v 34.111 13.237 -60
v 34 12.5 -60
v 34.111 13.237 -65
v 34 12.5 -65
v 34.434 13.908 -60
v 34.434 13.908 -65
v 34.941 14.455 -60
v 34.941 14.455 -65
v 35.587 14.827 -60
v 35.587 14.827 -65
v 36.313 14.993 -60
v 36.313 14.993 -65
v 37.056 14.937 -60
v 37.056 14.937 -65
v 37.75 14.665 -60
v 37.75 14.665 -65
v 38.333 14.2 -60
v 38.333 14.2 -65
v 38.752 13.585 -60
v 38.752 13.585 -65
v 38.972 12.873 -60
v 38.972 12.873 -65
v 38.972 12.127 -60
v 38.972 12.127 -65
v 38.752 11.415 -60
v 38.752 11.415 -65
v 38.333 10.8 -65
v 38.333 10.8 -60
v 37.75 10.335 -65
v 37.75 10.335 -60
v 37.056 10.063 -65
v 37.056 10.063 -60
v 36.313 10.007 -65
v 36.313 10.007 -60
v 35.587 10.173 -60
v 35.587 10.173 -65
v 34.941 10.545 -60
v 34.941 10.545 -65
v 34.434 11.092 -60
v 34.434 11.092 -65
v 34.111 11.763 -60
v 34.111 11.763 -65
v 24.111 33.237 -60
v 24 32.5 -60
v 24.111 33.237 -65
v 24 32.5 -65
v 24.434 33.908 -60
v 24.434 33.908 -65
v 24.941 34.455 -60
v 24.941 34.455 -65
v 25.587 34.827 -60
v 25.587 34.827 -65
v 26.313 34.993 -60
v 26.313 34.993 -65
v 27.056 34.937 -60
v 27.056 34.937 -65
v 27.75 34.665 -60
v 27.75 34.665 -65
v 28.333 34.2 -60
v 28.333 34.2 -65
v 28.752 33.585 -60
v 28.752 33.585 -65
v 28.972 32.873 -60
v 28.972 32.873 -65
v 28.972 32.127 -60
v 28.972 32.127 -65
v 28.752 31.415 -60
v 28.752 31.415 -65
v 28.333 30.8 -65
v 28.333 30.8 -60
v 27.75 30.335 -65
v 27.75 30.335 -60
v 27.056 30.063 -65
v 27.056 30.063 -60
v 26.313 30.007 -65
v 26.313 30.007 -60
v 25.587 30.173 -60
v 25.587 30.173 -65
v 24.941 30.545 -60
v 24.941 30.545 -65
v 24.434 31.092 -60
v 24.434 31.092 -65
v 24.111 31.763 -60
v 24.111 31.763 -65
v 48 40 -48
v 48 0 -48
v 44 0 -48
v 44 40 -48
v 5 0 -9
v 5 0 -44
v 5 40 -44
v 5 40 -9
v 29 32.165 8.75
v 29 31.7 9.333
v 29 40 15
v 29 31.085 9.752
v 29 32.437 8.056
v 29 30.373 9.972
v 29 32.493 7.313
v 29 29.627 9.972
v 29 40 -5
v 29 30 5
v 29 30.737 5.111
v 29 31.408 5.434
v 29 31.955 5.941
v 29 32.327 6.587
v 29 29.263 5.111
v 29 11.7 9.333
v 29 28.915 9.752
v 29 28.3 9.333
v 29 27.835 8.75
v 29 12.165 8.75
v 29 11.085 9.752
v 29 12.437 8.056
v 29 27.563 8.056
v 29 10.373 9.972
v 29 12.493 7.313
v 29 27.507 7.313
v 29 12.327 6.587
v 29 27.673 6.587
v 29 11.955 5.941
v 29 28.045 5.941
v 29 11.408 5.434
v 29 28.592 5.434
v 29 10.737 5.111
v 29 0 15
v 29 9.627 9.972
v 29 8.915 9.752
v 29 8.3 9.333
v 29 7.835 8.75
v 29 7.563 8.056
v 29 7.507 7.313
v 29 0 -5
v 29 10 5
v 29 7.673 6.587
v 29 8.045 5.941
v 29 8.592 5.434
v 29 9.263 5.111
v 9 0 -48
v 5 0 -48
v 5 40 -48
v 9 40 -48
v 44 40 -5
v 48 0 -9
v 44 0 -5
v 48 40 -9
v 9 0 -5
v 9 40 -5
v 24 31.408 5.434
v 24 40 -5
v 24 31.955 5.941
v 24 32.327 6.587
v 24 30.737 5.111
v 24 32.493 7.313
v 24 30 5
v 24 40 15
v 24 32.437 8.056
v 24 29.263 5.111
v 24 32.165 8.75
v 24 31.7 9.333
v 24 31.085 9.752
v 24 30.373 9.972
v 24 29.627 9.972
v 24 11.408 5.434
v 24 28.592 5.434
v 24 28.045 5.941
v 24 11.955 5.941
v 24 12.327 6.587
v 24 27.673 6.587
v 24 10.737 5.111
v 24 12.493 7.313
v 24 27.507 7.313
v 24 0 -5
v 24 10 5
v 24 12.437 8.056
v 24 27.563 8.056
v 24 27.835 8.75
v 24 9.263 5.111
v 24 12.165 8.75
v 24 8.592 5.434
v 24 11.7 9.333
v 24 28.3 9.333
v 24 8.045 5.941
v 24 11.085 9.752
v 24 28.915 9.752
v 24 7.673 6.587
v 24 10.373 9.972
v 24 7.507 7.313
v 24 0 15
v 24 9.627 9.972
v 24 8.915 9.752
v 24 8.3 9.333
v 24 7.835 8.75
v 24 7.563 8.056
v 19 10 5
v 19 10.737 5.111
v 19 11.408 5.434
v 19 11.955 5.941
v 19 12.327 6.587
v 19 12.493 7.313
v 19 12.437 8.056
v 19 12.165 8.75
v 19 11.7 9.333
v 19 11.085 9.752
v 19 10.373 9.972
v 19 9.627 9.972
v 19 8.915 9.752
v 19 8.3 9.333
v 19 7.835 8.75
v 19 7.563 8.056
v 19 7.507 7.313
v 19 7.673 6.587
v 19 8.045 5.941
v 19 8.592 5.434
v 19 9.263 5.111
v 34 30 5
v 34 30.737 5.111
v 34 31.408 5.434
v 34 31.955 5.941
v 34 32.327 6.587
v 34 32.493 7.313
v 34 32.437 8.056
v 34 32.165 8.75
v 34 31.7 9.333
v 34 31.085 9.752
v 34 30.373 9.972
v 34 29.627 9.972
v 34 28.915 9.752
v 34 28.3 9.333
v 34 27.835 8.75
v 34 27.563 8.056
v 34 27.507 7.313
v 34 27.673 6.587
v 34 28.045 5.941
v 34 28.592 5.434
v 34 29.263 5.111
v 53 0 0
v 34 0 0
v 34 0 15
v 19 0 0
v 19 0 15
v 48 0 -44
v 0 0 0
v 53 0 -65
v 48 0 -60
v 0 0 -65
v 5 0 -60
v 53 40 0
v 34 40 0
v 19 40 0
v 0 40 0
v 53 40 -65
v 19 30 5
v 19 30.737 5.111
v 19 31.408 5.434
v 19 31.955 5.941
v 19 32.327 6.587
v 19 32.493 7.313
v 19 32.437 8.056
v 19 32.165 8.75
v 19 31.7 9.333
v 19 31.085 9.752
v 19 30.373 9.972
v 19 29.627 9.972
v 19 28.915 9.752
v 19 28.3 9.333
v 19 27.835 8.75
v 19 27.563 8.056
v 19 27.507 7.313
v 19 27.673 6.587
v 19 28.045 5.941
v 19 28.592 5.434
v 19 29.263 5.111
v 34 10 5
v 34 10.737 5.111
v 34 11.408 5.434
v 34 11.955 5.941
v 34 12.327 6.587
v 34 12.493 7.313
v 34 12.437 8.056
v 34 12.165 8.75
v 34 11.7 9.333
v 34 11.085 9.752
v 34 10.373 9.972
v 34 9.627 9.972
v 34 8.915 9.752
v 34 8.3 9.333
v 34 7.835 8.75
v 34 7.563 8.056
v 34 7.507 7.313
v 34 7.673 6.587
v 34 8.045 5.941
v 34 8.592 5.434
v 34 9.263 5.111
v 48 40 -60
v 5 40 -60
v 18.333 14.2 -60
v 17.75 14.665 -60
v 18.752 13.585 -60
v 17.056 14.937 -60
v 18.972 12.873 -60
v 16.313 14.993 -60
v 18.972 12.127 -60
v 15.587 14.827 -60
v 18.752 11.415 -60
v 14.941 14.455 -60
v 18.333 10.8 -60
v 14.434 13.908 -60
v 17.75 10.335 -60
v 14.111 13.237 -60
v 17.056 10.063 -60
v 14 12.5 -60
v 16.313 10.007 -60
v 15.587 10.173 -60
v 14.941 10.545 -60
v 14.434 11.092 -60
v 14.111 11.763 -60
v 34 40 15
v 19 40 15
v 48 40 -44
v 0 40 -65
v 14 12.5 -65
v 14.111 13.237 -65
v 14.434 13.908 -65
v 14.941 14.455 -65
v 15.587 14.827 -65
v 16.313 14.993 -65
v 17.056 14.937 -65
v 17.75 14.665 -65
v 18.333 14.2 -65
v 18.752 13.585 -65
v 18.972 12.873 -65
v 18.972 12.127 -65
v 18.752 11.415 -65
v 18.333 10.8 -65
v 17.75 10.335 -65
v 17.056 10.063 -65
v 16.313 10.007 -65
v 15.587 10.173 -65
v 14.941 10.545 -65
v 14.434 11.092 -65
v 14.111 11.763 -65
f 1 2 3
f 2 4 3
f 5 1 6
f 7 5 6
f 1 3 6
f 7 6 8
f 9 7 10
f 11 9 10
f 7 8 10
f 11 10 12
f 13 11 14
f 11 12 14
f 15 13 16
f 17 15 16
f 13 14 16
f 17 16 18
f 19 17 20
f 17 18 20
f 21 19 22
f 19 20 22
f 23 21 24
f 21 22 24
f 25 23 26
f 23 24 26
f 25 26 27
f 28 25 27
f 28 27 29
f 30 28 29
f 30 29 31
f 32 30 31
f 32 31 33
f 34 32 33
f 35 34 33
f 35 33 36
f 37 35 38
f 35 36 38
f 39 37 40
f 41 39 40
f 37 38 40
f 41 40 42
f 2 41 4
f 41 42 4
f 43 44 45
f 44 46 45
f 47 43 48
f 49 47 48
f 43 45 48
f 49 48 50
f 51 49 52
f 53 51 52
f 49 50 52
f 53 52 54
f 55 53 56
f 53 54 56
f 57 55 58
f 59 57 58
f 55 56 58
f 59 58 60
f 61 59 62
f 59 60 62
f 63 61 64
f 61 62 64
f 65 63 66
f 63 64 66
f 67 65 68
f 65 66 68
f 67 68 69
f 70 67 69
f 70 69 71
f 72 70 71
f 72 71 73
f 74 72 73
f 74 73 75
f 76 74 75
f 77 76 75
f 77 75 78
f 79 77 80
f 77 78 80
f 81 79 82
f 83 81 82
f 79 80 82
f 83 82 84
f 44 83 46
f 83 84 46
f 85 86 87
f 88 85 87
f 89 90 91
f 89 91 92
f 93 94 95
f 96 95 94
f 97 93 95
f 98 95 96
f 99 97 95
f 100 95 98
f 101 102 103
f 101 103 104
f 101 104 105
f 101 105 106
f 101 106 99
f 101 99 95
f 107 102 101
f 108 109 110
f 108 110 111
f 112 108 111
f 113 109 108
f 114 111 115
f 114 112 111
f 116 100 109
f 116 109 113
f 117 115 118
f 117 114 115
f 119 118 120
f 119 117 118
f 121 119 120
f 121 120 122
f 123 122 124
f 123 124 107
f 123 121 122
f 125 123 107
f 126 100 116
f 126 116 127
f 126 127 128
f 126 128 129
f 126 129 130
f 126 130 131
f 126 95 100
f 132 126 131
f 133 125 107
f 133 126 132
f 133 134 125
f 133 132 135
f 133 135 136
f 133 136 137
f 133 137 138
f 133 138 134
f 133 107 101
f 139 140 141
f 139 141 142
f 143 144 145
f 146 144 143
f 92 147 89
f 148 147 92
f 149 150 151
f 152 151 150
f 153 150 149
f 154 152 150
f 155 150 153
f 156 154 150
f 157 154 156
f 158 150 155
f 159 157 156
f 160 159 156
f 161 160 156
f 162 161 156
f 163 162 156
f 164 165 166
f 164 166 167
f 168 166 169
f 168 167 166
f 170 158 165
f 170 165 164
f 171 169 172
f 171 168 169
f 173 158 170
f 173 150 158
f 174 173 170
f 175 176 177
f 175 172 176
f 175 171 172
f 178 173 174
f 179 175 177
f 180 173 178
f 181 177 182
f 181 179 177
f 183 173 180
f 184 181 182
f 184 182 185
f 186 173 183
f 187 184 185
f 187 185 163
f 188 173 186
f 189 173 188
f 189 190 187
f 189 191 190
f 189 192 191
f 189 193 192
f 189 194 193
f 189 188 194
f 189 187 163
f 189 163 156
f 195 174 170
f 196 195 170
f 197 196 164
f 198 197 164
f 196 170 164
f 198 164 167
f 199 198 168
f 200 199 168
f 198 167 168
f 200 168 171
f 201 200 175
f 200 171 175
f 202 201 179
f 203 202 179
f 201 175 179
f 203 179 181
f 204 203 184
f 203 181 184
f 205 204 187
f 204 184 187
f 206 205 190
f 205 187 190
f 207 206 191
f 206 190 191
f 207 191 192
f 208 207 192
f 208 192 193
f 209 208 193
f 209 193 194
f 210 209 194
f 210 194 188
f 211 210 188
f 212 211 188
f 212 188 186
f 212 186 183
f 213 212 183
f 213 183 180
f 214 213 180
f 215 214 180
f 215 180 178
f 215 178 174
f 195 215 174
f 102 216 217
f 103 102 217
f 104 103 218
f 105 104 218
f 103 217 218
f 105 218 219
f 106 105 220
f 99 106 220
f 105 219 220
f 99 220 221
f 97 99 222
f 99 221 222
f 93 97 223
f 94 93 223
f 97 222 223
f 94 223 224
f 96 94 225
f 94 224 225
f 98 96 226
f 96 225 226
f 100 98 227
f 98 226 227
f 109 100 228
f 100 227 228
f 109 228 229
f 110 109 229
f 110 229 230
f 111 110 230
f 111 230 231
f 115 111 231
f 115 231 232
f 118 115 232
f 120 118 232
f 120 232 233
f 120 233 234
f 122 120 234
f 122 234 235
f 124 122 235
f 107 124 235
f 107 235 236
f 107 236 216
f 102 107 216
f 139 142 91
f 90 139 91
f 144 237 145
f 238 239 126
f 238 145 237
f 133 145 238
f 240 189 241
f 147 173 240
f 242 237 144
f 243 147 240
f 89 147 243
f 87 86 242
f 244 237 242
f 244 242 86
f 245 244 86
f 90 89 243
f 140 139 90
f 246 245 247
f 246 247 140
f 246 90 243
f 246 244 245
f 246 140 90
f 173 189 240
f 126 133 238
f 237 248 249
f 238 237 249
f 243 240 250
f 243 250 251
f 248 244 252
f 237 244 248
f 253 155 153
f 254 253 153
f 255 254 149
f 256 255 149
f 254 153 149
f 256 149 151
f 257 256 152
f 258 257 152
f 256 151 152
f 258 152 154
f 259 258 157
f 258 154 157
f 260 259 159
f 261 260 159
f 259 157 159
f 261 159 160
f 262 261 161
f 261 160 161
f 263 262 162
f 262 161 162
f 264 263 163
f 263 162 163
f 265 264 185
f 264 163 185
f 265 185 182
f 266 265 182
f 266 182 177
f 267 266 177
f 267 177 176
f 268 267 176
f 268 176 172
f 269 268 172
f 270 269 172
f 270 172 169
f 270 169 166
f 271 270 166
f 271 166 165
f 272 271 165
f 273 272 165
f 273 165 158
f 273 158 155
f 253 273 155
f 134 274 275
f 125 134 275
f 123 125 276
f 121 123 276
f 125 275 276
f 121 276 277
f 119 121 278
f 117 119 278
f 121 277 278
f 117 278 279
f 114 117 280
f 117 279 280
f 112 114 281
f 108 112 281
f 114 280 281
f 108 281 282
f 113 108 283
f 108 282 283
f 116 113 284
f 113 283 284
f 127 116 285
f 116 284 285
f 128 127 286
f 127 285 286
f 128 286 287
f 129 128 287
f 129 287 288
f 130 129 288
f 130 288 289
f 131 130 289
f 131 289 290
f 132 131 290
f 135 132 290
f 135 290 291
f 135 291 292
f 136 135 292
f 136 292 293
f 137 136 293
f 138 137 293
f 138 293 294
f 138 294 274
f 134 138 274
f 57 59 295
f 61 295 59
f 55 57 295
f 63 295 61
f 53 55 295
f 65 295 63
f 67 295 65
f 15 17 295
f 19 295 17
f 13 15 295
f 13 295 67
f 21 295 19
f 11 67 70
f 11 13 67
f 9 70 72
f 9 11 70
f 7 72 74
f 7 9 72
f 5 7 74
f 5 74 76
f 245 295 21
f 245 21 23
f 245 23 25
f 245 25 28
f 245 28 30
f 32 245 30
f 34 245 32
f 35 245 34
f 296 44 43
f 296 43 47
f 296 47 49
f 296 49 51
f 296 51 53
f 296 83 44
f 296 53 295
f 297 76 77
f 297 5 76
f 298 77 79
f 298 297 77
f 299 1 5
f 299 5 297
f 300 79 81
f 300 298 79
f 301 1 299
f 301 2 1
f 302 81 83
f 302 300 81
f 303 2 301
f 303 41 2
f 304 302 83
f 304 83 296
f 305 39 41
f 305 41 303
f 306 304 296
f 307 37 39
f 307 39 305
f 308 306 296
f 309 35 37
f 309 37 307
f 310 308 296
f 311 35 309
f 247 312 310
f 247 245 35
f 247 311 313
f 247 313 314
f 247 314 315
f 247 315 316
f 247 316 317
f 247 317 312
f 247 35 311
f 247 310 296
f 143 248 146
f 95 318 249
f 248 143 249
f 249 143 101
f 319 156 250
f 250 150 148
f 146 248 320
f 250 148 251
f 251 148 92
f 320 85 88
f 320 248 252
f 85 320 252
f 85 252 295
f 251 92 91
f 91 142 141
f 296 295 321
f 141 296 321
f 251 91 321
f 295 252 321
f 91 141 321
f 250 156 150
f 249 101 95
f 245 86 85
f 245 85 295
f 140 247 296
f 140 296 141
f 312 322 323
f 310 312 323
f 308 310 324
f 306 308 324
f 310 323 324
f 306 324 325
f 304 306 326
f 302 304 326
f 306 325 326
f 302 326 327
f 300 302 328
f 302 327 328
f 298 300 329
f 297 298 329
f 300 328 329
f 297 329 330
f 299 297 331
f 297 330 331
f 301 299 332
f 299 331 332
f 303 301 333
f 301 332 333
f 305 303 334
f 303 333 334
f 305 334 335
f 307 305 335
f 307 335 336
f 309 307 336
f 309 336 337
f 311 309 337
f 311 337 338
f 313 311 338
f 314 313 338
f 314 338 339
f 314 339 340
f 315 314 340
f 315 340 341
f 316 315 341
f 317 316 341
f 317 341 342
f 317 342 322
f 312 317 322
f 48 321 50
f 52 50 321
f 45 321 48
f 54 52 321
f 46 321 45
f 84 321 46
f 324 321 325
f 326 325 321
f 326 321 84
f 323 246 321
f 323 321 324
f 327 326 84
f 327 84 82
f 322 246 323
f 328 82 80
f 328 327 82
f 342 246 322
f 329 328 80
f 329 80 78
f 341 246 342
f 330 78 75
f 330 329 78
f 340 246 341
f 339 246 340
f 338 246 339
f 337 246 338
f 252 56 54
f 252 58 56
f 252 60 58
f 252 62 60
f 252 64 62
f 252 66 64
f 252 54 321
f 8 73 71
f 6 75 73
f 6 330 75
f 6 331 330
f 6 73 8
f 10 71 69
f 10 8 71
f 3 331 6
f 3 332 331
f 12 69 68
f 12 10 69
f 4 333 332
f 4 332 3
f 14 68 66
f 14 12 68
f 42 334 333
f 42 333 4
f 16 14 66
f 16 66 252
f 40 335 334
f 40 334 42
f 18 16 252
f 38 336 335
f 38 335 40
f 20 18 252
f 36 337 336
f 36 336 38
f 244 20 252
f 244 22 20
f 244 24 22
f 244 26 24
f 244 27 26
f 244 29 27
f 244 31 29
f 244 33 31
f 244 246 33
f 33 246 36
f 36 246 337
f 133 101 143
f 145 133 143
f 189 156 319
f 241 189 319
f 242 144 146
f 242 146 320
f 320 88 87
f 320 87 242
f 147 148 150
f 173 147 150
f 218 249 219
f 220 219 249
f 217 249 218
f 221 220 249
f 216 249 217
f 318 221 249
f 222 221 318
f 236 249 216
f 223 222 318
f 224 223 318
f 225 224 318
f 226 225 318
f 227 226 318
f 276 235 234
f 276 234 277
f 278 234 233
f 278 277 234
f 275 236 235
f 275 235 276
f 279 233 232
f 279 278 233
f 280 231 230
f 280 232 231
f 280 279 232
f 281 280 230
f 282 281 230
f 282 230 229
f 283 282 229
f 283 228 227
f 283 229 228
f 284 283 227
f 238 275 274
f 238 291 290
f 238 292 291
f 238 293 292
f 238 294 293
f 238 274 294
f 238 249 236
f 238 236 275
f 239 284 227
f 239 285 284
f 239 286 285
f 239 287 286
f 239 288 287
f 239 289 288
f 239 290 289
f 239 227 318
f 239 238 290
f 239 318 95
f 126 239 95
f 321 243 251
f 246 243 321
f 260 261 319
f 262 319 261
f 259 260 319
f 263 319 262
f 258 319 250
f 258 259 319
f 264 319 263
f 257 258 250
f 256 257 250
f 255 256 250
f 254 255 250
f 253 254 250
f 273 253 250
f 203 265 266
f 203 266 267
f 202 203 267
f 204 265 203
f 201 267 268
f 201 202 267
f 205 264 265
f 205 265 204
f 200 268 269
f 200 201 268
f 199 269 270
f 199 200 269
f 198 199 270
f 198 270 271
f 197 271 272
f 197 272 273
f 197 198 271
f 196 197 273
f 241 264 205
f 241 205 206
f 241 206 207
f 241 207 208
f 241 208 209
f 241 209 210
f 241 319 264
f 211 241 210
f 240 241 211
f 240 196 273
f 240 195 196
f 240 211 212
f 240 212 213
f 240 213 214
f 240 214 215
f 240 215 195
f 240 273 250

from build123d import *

# Parameters (mm, degrees)
MAIN_DEPTH          = 40
CHAMFER_1_SIZE      = 4
HOLES_REACH         = 105.966
SKETCH_2_R          = 2.5
EXTRUDE_3_DEPTH     = 40
CUT_EXTRUDE_4_REACH = 85.552
SKETCH_4_R          = 2.5


with BuildPart() as part:
    # Эскиз1 → main (new body)
    with BuildSketch(Plane(origin=(0, 0, 0), x_dir=(1, 0, 0), z_dir=(0, 1, 0))):
        Polygon((0, 0), (0, 65), (53, 65), (53, 0), (34, 0), (34, -15), (29, -15), (29, 5), (48, 5), (48, 60), (5, 60), (5, 5), (24, 5), (24, -15), (19, -15), (19, 0), align=None)
    extrude(amount=MAIN_DEPTH)

    # Фаска1
    chamfer_1_edges = [part.edges().sort_by_distance(p)[0] for p in [
        (48, 20, -5),
        (5, 20, -5),
    ]]
    chamfer(chamfer_1_edges, length=CHAMFER_1_SIZE)

    # Эскиз2 → holes (cut, up to next)
    with BuildSketch(Plane(origin=(0, 0, -65), x_dir=(-1, 0, 0), z_dir=(0, 0, -1)), mode=Mode.PRIVATE) as holes_sk1:
        with Locations((-26.5, 32.5)):
            Circle(SKETCH_2_R)
    holes_tool1 = extrude(holes_sk1.sketch, amount=-HOLES_REACH, mode=Mode.PRIVATE) & part.part
    # Эскиз2 → holes (cut, up to next)
    with BuildSketch(Plane(origin=(0, 0, -65), x_dir=(-1, 0, 0), z_dir=(0, 0, -1)), mode=Mode.PRIVATE) as holes_sk2:
        with Locations((-36.5, 12.5)):
            Circle(SKETCH_2_R)
    holes_tool2 = extrude(holes_sk2.sketch, amount=-HOLES_REACH, mode=Mode.PRIVATE) & part.part
    # Эскиз2 → holes (cut, up to next)
    with BuildSketch(Plane(origin=(0, 0, -65), x_dir=(-1, 0, 0), z_dir=(0, 0, -1)), mode=Mode.PRIVATE) as holes_sk3:
        with Locations((-16.5, 12.5)):
            Circle(SKETCH_2_R)
    holes_tool3 = extrude(holes_sk3.sketch, amount=-HOLES_REACH, mode=Mode.PRIVATE) & part.part
    add(holes_tool1.solids().sort_by_distance((26.5, 32.5, -65))[0], mode=Mode.SUBTRACT)
    add(holes_tool2.solids().sort_by_distance((36.5, 12.5, -65))[0], mode=Mode.SUBTRACT)
    add(holes_tool3.solids().sort_by_distance((16.5, 12.5, -65))[0], mode=Mode.SUBTRACT)

    # Эскиз3 → Вытянуть3 (add)
    with BuildSketch(Plane(origin=(0, 0, 0), x_dir=(1, 0, 0), z_dir=(0, 1, 0))):
        Polygon((5, 44), (5, 48), (9, 48), align=None)
        Polygon((44, 48), (48, 44), (48, 48), align=None)
    extrude(amount=EXTRUDE_3_DEPTH)

    # Вытянуть4: up to this face of the body (flat: up to its plane)
    cut_extrude_4_end = Plane(part.part.faces().sort_by_distance((19, 20, 7.5))[0])
    # Эскиз4 → Вытянуть4 (cut, up to the picked face)
    with BuildSketch(Plane(origin=(34, 0, 0), x_dir=(0, 0, -1), z_dir=(1, 0, 0)), mode=Mode.PRIVATE) as cut_extrude_4_sk1:
        with Locations((-7.5, 10)):
            Circle(SKETCH_4_R)
    cut_extrude_4_tool1 = split(extrude(cut_extrude_4_sk1.sketch, amount=-CUT_EXTRUDE_4_REACH, mode=Mode.PRIVATE), bisect_by=cut_extrude_4_end, keep=Keep.BOTH, mode=Mode.PRIVATE)
    # Эскиз4 → Вытянуть4 (cut, up to the picked face)
    with BuildSketch(Plane(origin=(34, 0, 0), x_dir=(0, 0, -1), z_dir=(1, 0, 0)), mode=Mode.PRIVATE) as cut_extrude_4_sk2:
        with Locations((-7.5, 30)):
            Circle(SKETCH_4_R)
    cut_extrude_4_tool2 = split(extrude(cut_extrude_4_sk2.sketch, amount=-CUT_EXTRUDE_4_REACH, mode=Mode.PRIVATE), bisect_by=cut_extrude_4_end, keep=Keep.BOTH, mode=Mode.PRIVATE)
    add(cut_extrude_4_tool1.solids().sort_by(Axis((34, 10, 7.5), (-1, 0, 0)))[0], mode=Mode.SUBTRACT)
    add(cut_extrude_4_tool2.solids().sort_by(Axis((34, 30, 7.5), (-1, 0, 0)))[0], mode=Mode.SUBTRACT)


solid = part.part
